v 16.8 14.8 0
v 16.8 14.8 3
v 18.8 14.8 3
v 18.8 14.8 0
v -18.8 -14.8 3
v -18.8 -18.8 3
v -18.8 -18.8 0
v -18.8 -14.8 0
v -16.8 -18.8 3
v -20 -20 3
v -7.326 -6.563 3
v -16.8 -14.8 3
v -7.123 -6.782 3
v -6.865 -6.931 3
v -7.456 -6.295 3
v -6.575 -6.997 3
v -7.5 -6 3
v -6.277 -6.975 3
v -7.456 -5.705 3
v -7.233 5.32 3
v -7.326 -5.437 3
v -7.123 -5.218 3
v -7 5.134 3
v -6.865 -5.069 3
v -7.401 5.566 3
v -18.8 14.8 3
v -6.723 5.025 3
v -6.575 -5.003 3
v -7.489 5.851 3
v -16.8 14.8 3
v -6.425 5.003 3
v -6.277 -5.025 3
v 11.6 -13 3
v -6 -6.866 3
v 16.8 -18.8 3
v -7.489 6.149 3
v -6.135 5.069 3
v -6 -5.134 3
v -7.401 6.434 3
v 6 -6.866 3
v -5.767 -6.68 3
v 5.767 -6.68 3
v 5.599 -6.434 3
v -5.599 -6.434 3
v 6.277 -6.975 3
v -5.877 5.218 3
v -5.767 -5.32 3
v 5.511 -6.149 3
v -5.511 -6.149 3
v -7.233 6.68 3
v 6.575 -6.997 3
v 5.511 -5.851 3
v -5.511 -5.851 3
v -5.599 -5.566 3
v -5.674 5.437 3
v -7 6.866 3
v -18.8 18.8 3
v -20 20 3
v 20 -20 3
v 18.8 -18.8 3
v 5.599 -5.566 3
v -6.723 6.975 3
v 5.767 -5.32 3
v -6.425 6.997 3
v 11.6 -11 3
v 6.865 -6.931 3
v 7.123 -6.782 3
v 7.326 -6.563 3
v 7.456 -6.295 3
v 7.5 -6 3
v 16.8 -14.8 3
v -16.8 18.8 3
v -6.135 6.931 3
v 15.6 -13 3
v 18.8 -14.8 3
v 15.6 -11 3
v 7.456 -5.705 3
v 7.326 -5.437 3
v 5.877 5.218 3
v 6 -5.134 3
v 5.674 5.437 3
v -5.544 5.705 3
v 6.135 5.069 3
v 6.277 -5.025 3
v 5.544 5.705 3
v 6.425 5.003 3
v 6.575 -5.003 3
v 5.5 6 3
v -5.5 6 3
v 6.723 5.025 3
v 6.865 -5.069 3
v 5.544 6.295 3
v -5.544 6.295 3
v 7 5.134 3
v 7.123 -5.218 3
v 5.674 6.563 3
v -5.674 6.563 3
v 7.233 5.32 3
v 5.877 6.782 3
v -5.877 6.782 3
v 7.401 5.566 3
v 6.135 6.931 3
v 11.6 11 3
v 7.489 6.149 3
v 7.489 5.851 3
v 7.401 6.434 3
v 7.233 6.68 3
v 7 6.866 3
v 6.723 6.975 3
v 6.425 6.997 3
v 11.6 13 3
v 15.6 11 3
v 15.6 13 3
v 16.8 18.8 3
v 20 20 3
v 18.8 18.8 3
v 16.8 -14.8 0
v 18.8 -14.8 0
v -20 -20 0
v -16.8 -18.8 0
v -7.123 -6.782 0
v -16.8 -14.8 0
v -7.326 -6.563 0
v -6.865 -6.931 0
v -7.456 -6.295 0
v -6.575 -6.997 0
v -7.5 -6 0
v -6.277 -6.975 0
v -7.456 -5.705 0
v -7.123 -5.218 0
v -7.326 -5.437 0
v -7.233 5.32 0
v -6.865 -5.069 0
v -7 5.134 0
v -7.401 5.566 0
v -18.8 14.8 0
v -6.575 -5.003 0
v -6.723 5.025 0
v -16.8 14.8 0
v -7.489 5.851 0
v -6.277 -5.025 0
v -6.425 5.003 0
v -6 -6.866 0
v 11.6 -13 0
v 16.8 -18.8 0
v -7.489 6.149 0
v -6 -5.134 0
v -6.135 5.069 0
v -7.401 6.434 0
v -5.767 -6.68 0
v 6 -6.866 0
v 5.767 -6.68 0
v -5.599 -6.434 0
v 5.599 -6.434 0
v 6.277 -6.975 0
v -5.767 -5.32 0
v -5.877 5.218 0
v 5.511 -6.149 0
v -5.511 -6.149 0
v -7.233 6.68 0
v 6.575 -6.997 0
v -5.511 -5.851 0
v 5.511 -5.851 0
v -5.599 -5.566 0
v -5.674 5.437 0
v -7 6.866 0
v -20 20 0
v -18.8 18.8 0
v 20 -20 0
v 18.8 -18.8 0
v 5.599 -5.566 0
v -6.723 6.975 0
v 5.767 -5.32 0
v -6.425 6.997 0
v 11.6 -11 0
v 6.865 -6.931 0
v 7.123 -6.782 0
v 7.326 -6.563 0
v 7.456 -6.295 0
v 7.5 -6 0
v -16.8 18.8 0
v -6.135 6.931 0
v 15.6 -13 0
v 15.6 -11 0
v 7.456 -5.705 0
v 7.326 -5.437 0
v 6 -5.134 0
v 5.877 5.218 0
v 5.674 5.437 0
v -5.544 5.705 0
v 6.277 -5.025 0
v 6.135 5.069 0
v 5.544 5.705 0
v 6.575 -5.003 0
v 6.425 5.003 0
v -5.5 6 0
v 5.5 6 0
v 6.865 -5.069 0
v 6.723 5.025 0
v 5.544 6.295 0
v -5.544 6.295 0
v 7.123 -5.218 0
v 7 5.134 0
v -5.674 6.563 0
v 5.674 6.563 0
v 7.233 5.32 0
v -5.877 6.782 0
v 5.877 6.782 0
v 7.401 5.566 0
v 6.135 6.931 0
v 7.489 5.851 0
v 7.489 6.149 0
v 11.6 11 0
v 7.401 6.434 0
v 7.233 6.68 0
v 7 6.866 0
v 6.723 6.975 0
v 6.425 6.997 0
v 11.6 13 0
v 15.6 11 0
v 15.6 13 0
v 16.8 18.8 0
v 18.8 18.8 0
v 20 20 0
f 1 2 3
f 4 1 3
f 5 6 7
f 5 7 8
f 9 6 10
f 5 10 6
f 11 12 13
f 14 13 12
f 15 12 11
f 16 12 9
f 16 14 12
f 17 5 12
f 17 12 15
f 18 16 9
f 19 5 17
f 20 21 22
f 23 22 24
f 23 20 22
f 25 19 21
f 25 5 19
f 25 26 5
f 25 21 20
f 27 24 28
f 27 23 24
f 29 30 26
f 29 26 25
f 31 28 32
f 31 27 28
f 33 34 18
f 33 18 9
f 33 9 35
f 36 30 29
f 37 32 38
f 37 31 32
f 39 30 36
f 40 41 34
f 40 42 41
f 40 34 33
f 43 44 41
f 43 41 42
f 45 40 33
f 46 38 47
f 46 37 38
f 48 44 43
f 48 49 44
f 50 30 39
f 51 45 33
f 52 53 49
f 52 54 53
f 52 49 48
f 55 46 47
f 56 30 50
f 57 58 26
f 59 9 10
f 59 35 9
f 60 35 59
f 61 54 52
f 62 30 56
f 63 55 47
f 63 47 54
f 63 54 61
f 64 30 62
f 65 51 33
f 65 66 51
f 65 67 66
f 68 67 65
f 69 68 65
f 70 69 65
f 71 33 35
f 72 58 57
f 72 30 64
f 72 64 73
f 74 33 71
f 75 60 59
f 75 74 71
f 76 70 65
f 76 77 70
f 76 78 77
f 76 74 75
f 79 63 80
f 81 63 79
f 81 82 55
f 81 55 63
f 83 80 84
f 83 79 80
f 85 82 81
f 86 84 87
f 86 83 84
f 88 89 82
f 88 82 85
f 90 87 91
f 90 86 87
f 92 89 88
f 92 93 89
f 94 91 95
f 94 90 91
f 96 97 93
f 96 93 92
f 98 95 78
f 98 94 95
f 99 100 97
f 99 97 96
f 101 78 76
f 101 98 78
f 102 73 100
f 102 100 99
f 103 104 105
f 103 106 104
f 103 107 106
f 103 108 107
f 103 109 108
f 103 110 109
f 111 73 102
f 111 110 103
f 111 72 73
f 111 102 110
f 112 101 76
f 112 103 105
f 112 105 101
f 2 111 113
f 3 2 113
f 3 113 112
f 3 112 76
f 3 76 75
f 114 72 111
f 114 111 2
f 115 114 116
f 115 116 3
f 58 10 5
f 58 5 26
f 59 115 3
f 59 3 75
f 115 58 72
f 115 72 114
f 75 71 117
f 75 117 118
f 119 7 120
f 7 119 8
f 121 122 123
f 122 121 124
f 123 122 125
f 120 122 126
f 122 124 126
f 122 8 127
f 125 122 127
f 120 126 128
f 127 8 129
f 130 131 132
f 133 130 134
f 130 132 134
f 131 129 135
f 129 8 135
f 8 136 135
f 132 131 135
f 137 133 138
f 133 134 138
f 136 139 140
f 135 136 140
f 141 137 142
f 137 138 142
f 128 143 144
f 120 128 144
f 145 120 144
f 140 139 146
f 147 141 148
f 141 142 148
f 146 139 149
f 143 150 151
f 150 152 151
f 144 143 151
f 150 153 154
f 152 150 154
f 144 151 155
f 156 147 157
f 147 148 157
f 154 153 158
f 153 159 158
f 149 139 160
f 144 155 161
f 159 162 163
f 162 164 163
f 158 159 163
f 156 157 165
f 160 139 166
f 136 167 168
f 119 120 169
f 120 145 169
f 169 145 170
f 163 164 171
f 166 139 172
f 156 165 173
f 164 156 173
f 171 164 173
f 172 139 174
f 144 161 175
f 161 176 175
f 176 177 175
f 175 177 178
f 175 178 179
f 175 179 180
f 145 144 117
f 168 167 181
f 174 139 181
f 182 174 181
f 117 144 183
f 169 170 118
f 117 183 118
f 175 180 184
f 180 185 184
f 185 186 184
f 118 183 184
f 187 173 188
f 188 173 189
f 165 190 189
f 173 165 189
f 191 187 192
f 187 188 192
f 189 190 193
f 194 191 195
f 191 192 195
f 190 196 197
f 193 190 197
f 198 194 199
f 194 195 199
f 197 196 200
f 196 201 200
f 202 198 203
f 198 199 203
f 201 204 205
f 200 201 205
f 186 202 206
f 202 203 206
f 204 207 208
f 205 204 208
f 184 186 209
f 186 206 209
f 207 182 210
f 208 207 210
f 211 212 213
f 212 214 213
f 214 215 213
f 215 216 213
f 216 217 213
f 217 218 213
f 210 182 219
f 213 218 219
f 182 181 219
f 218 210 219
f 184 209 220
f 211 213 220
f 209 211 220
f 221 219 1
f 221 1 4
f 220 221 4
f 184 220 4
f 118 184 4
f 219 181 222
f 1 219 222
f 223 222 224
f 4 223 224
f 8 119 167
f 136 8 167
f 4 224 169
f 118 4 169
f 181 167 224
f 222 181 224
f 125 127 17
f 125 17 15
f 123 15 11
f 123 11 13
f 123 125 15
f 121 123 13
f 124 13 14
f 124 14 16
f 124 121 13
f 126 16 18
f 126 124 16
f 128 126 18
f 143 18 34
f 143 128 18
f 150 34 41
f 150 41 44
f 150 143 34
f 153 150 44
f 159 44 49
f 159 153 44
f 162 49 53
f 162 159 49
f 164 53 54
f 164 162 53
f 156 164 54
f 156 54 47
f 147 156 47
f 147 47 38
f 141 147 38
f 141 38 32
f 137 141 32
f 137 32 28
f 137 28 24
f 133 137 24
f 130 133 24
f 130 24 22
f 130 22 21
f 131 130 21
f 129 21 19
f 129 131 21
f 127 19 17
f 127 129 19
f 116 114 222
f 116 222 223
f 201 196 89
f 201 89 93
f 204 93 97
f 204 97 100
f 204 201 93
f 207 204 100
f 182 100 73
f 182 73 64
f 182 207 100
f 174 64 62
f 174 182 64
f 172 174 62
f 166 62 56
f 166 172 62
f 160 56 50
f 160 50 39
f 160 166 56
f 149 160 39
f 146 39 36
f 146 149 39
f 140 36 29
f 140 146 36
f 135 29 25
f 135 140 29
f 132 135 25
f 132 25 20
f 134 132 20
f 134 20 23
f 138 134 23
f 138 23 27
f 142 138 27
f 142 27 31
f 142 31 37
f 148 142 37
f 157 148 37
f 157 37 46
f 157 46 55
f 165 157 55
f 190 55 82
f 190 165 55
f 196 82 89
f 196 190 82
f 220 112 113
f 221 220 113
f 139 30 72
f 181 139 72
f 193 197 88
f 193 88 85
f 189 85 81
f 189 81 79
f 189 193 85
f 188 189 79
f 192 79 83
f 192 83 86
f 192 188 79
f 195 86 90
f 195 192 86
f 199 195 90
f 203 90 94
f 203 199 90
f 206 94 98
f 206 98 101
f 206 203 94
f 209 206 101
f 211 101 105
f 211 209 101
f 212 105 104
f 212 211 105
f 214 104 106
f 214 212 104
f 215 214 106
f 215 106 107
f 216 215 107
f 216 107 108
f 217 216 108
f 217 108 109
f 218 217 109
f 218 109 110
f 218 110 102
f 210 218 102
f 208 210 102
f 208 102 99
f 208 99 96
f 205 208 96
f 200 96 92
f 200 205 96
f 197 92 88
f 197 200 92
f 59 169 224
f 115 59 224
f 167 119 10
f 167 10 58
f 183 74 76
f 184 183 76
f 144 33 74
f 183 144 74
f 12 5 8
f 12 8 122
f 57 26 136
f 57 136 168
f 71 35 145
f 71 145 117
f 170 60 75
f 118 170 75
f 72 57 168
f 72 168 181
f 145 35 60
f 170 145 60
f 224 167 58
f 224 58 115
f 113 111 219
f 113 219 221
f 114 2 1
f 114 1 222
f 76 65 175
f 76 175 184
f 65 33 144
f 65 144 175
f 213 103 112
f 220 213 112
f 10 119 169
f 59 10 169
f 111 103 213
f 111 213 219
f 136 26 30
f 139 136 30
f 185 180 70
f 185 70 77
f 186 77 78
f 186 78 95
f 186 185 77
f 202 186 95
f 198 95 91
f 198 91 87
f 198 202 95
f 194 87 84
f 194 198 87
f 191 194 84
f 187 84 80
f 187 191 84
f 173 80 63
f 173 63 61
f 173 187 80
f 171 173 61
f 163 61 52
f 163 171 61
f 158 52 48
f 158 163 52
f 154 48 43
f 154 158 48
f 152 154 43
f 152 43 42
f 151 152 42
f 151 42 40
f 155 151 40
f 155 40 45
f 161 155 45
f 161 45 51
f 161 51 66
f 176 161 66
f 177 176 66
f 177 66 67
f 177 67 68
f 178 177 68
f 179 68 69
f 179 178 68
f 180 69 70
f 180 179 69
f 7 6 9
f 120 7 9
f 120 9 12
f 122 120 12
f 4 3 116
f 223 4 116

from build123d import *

# Parameters (mm, degrees)
SKETCH1_W           = 40
SKETCH1_H           = 40
SKETCH1_R           = 1
BOSS_EXTRUDE1_DEPTH = 3
SKETCH2_W           = 2
SKETCH2_H           = 4
SKETCH2_W_2         = 4
SKETCH2_H_2         = 2
CUT_EXTRUDE1_DEPTH  = 29.442925307


with BuildPart() as part:
    # Sketch1 → Boss-Extrude1 (new body)
    with BuildSketch(Plane.XY):
        Rectangle(SKETCH1_W, SKETCH1_H)
        with Locations((6.5, -6)):
            Circle(SKETCH1_R, mode=Mode.SUBTRACT)
        with Locations(Location((-6.5, -6, 0), (0, 0, 180))):
            Circle(SKETCH1_R, mode=Mode.SUBTRACT)
        with Locations(Location((6.5, 6, 0), (0, 0, 180))):
            Circle(SKETCH1_R, mode=Mode.SUBTRACT)
        with Locations((-6.5, 6)):
            Circle(SKETCH1_R, mode=Mode.SUBTRACT)
    extrude(amount=BOSS_EXTRUDE1_DEPTH)

    # Sketch2 → Cut-Extrude1 (cut, through all)
    with BuildSketch(Plane.XY.offset(3)):
        with Locations((17.8, 16.8)):
            Rectangle(SKETCH2_W, SKETCH2_H)
        with Locations((-17.8, 16.8)):
            Rectangle(SKETCH2_W, SKETCH2_H)
        with Locations((13.6, 12)):
            Rectangle(SKETCH2_W_2, SKETCH2_H_2)
        with Locations((17.8, -16.8)):
            Rectangle(SKETCH2_W, SKETCH2_H)
        with Locations((-17.8, -16.8)):
            Rectangle(SKETCH2_W, SKETCH2_H)
        with Locations((13.6, -12)):
            Rectangle(SKETCH2_W_2, SKETCH2_H_2)
    extrude(amount=-CUT_EXTRUDE1_DEPTH, mode=Mode.SUBTRACT)


solid = part.part
